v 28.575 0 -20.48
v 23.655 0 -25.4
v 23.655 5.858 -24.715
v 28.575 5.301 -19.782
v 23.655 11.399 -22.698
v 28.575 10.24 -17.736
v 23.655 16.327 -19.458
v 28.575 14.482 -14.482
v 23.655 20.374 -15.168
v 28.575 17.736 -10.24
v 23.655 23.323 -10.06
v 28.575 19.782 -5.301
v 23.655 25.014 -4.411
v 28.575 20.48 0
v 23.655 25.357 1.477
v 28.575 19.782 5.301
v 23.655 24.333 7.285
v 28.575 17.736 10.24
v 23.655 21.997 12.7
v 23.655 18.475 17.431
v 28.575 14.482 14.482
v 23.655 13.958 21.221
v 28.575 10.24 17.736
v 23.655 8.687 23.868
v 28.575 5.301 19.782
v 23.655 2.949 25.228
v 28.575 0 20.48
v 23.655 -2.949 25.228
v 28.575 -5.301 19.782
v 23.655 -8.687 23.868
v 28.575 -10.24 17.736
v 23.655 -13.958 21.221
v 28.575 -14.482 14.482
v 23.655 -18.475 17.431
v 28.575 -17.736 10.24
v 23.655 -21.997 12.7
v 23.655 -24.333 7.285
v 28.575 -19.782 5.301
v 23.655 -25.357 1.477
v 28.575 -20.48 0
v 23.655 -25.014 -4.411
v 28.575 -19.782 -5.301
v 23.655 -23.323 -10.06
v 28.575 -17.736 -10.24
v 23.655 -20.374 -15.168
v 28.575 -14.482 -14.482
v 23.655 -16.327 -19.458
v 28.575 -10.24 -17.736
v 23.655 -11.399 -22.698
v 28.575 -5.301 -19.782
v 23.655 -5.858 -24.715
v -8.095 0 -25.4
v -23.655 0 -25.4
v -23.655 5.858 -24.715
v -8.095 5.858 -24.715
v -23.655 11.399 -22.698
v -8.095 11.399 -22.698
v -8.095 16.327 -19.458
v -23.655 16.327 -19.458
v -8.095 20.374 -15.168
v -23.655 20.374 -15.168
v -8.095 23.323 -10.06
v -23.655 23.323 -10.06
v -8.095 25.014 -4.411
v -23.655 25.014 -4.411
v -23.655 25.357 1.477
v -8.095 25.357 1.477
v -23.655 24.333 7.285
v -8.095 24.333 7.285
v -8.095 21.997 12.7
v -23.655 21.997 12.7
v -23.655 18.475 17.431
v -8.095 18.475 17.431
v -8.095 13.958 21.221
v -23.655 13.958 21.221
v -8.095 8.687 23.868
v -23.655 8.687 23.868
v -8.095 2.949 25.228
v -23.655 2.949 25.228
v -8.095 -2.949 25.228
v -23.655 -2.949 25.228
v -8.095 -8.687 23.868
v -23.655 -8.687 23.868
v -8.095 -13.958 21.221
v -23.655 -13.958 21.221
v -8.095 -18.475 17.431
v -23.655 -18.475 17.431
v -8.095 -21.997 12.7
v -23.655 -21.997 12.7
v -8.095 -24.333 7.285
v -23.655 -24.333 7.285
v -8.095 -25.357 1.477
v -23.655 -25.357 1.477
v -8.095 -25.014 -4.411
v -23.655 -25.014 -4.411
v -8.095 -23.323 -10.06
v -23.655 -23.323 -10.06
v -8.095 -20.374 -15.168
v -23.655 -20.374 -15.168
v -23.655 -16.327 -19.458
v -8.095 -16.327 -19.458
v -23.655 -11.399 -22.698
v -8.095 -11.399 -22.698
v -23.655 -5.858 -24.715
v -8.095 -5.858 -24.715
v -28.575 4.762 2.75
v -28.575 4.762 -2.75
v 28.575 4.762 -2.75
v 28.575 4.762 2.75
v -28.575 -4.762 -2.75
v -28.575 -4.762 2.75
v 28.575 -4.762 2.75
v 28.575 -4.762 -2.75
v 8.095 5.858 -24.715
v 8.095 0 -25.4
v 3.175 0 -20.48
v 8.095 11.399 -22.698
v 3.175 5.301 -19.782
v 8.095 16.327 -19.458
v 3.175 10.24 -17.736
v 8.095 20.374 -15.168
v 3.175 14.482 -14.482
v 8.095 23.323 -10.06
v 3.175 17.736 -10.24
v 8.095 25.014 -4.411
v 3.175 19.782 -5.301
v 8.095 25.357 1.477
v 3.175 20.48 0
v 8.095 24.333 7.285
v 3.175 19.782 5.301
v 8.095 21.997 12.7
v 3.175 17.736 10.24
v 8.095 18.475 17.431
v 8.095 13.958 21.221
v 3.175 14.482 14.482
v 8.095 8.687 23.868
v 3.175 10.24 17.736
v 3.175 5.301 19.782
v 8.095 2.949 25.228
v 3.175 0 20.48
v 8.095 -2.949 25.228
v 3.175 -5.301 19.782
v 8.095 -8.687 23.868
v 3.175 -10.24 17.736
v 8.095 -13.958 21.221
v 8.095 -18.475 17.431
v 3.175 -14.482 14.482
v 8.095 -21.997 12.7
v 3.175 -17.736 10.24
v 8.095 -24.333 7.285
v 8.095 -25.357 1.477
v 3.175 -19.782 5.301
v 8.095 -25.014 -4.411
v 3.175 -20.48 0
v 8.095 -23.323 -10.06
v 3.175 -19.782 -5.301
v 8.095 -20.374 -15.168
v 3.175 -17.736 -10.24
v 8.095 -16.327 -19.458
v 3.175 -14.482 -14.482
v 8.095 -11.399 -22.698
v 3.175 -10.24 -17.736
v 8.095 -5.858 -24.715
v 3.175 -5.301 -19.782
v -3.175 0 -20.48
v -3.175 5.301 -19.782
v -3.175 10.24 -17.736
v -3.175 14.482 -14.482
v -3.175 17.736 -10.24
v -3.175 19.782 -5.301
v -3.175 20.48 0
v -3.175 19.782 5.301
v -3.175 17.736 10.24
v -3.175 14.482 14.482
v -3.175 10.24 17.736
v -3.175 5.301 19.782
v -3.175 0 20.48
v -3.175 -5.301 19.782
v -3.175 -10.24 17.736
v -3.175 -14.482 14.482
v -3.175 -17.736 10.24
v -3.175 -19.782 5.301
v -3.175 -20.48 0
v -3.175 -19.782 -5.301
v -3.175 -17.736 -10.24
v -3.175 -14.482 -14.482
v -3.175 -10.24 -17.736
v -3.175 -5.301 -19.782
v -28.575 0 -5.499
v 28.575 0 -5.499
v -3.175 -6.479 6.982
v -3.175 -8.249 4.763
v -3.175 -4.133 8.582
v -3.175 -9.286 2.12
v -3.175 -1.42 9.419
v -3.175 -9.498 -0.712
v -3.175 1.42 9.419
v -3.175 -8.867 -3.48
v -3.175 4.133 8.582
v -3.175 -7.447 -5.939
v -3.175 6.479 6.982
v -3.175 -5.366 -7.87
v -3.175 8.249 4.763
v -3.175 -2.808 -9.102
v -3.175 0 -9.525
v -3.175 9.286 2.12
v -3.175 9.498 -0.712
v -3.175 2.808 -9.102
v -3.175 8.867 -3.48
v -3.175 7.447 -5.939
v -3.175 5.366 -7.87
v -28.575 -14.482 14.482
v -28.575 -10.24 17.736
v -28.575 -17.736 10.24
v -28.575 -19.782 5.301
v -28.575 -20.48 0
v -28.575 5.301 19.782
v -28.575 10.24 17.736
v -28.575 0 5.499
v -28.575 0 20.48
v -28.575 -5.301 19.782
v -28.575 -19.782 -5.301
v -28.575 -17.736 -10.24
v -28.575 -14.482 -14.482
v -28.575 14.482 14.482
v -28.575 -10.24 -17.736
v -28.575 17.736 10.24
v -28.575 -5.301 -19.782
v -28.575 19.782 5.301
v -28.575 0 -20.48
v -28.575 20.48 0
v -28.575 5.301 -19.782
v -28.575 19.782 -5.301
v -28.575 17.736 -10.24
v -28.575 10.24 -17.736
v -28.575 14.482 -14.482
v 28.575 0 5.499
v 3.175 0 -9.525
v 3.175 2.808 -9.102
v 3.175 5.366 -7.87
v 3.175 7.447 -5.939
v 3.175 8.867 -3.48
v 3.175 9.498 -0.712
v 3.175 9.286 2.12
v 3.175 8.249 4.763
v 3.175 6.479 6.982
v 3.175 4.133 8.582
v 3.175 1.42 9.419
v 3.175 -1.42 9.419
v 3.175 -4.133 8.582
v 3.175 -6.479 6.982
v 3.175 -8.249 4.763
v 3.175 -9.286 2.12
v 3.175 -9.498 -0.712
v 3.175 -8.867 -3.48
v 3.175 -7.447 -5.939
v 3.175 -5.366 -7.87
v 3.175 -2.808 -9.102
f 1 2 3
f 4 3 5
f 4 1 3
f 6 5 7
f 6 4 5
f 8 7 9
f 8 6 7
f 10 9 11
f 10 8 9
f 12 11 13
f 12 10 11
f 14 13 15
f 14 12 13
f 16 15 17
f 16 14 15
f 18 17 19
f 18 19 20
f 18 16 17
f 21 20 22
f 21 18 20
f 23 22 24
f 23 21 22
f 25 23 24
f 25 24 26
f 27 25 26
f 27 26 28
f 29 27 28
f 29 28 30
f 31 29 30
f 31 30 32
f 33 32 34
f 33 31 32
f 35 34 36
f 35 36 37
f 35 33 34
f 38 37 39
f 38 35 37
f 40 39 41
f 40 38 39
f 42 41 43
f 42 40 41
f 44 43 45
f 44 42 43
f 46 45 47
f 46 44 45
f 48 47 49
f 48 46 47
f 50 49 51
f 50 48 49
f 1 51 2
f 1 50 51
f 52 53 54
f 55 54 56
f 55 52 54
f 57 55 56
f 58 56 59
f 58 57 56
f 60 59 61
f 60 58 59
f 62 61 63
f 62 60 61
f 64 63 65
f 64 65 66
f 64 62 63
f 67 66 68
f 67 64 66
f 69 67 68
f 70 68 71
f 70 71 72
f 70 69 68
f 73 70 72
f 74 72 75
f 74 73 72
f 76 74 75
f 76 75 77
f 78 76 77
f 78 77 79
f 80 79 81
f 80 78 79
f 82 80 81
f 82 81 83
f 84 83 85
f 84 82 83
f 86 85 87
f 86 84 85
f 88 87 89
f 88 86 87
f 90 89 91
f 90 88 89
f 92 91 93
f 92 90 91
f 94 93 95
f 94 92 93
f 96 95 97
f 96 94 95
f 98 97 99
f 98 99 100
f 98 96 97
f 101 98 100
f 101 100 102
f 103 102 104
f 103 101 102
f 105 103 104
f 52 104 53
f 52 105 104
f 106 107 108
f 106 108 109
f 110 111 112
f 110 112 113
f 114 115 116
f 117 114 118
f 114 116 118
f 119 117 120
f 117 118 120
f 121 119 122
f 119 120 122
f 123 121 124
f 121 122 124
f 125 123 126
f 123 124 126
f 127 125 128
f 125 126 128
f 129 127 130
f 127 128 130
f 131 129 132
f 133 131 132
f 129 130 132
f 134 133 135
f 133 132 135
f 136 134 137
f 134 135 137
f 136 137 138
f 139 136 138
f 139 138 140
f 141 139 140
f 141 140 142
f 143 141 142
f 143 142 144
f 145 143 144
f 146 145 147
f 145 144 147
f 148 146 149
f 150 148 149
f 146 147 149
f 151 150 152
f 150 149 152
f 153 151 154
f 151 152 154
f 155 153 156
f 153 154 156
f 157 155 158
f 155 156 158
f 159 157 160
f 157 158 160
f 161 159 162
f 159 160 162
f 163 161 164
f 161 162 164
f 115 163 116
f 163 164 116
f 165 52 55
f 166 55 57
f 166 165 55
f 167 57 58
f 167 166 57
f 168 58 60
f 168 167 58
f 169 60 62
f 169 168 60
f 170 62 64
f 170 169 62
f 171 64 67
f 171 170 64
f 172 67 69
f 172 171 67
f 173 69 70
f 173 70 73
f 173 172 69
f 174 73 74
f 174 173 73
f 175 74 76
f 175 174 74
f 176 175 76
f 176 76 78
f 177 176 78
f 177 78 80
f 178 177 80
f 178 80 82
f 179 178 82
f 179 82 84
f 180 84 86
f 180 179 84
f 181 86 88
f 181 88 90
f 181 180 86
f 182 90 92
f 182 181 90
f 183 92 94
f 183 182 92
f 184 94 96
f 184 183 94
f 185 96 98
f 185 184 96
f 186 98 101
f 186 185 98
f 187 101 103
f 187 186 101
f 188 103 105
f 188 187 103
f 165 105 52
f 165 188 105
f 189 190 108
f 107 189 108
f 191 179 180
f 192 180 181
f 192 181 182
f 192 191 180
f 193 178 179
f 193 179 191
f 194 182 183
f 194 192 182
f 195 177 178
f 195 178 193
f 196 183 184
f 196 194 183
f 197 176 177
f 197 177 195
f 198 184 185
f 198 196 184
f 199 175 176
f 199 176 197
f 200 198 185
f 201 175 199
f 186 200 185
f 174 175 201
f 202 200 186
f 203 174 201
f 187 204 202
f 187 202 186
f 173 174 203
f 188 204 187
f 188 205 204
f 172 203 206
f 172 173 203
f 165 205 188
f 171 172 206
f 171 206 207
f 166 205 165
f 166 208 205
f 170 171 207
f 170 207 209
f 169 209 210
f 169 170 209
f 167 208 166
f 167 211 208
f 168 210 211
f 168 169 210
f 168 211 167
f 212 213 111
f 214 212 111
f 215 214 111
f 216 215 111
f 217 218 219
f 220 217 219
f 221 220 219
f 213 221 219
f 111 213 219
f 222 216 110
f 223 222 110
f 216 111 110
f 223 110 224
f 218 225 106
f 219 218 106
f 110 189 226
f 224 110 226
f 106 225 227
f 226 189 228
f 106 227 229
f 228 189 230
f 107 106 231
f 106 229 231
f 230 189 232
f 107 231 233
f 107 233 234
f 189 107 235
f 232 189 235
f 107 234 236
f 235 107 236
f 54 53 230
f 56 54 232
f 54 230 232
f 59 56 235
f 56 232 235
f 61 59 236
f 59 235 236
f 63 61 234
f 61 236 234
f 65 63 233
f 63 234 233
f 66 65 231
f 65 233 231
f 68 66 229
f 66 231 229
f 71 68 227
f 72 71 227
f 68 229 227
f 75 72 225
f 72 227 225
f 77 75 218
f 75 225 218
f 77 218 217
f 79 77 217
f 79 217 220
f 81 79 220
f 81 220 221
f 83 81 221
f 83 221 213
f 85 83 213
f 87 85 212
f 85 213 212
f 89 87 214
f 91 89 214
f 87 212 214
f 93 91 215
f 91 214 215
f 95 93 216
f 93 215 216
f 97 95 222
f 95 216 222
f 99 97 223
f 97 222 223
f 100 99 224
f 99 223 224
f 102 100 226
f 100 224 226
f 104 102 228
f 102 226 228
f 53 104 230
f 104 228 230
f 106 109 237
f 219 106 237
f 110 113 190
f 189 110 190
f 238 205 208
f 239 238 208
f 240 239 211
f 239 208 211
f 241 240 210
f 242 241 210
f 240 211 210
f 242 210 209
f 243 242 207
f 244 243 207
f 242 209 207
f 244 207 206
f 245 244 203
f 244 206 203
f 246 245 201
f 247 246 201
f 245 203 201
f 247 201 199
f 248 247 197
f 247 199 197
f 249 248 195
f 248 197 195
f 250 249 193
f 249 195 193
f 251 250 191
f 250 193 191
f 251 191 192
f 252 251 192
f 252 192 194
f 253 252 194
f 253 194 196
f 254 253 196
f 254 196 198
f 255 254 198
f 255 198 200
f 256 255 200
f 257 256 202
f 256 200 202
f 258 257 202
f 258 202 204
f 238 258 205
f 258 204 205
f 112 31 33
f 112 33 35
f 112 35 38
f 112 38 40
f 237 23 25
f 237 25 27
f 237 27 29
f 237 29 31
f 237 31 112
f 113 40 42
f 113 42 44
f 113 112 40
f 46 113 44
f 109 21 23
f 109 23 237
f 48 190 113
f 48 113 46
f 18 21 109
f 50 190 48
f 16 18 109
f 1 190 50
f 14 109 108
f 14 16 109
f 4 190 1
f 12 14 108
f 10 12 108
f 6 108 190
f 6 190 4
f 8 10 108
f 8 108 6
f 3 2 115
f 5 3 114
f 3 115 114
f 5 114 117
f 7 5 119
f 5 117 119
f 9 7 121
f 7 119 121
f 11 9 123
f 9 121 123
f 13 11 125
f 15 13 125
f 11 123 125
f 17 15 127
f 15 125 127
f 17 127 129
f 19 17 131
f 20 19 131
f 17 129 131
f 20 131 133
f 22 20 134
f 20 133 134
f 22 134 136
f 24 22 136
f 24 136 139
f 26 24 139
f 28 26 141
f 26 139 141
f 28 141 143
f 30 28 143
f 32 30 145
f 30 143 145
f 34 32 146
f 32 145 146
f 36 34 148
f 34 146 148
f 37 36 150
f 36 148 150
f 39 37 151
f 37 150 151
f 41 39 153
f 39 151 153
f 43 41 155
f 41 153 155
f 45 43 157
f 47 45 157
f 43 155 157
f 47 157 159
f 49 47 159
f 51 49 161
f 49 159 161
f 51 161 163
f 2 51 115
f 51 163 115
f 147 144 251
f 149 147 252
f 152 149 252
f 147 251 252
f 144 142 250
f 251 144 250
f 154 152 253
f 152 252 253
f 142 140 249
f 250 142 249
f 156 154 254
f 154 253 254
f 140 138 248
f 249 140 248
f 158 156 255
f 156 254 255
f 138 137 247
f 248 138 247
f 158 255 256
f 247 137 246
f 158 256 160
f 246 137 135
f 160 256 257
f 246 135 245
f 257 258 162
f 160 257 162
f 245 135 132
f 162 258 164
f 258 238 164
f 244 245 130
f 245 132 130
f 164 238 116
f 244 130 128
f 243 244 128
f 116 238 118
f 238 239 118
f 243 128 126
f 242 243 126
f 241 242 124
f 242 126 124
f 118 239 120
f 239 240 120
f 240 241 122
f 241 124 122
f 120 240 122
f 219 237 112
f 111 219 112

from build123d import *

# Parameters (mm, degrees)
BOSS_EXTRUDE1_START = -3.175
SKETCH1_R           = 25.4
BOSS_EXTRUDE1_DEPTH = 25.4
BOSS_EXTRUDE3_START = 3.175
SKETCH1_3_R         = 25.4
BOSS_EXTRUDE3_DEPTH = 25.4
CHAMFER1_SIZE       = 4.92
CHAMFER2_SIZE       = 4.92
SKETCH2_R           = 9.525
BOSS_EXTRUDE4_DEPTH = 6.35
CUT_EXTRUDE1_DEPTH  = 58.15


with BuildPart() as part:
    # Sketch1 → Boss-Extrude1 (new body)
    with BuildSketch(Plane(origin=(0, 0, 0), x_dir=(0, 0, -1), z_dir=(1, 0, 0)).offset(BOSS_EXTRUDE1_START)):
        Circle(SKETCH1_R)
    extrude(amount=-BOSS_EXTRUDE1_DEPTH)

    # Chamfer1
    chamfer1_edges = [part.edges().sort_by_distance(p)[0] for p in [
        (-3.175, 0, 25.4),
        (-28.575, 0, 25.4),
    ]]
    chamfer(chamfer1_edges, length=CHAMFER1_SIZE)



with BuildPart() as body_2:
    # Sketch1<3> → Boss-Extrude3 (new body)
    with BuildSketch(Plane(origin=(0, 0, 0), x_dir=(0, 0, -1), z_dir=(1, 0, 0)).offset(BOSS_EXTRUDE3_START)):
        Circle(SKETCH1_3_R)
    extrude(amount=BOSS_EXTRUDE3_DEPTH)

    # Chamfer2
    chamfer2_edges = [body_2.edges().sort_by_distance(p)[0] for p in [
        (3.175, 0, 25.4),
        (28.575, 0, 25.4),
    ]]
    chamfer(chamfer2_edges, length=CHAMFER2_SIZE)


with BuildPart() as part_1:
    add(part.part)

    add(body_2.part)  # Boss-Extrude4 merges body 2
    # Sketch2 → Boss-Extrude4 (add)
    with BuildSketch(Plane(origin=(-3.175, 0, 0), x_dir=(0, 0, -1), z_dir=(1, 0, 0))):
        Circle(SKETCH2_R)
    extrude(amount=BOSS_EXTRUDE4_DEPTH)

    # Sketch3 → Cut-Extrude1 (cut, through all)
    with BuildSketch(Plane(origin=(28.575, 0, 0), x_dir=(0, 0, -1), z_dir=(1, 0, 0))):
        Polygon((2.749630657, -4.7625), (5.499261314, 0), (2.749630657, 4.7625), (-2.749630657, 4.7625), (-5.499261314, 0), (-2.749630657, -4.7625), align=None)
    extrude(amount=-CUT_EXTRUDE1_DEPTH, mode=Mode.SUBTRACT)


solid = part_1.part
